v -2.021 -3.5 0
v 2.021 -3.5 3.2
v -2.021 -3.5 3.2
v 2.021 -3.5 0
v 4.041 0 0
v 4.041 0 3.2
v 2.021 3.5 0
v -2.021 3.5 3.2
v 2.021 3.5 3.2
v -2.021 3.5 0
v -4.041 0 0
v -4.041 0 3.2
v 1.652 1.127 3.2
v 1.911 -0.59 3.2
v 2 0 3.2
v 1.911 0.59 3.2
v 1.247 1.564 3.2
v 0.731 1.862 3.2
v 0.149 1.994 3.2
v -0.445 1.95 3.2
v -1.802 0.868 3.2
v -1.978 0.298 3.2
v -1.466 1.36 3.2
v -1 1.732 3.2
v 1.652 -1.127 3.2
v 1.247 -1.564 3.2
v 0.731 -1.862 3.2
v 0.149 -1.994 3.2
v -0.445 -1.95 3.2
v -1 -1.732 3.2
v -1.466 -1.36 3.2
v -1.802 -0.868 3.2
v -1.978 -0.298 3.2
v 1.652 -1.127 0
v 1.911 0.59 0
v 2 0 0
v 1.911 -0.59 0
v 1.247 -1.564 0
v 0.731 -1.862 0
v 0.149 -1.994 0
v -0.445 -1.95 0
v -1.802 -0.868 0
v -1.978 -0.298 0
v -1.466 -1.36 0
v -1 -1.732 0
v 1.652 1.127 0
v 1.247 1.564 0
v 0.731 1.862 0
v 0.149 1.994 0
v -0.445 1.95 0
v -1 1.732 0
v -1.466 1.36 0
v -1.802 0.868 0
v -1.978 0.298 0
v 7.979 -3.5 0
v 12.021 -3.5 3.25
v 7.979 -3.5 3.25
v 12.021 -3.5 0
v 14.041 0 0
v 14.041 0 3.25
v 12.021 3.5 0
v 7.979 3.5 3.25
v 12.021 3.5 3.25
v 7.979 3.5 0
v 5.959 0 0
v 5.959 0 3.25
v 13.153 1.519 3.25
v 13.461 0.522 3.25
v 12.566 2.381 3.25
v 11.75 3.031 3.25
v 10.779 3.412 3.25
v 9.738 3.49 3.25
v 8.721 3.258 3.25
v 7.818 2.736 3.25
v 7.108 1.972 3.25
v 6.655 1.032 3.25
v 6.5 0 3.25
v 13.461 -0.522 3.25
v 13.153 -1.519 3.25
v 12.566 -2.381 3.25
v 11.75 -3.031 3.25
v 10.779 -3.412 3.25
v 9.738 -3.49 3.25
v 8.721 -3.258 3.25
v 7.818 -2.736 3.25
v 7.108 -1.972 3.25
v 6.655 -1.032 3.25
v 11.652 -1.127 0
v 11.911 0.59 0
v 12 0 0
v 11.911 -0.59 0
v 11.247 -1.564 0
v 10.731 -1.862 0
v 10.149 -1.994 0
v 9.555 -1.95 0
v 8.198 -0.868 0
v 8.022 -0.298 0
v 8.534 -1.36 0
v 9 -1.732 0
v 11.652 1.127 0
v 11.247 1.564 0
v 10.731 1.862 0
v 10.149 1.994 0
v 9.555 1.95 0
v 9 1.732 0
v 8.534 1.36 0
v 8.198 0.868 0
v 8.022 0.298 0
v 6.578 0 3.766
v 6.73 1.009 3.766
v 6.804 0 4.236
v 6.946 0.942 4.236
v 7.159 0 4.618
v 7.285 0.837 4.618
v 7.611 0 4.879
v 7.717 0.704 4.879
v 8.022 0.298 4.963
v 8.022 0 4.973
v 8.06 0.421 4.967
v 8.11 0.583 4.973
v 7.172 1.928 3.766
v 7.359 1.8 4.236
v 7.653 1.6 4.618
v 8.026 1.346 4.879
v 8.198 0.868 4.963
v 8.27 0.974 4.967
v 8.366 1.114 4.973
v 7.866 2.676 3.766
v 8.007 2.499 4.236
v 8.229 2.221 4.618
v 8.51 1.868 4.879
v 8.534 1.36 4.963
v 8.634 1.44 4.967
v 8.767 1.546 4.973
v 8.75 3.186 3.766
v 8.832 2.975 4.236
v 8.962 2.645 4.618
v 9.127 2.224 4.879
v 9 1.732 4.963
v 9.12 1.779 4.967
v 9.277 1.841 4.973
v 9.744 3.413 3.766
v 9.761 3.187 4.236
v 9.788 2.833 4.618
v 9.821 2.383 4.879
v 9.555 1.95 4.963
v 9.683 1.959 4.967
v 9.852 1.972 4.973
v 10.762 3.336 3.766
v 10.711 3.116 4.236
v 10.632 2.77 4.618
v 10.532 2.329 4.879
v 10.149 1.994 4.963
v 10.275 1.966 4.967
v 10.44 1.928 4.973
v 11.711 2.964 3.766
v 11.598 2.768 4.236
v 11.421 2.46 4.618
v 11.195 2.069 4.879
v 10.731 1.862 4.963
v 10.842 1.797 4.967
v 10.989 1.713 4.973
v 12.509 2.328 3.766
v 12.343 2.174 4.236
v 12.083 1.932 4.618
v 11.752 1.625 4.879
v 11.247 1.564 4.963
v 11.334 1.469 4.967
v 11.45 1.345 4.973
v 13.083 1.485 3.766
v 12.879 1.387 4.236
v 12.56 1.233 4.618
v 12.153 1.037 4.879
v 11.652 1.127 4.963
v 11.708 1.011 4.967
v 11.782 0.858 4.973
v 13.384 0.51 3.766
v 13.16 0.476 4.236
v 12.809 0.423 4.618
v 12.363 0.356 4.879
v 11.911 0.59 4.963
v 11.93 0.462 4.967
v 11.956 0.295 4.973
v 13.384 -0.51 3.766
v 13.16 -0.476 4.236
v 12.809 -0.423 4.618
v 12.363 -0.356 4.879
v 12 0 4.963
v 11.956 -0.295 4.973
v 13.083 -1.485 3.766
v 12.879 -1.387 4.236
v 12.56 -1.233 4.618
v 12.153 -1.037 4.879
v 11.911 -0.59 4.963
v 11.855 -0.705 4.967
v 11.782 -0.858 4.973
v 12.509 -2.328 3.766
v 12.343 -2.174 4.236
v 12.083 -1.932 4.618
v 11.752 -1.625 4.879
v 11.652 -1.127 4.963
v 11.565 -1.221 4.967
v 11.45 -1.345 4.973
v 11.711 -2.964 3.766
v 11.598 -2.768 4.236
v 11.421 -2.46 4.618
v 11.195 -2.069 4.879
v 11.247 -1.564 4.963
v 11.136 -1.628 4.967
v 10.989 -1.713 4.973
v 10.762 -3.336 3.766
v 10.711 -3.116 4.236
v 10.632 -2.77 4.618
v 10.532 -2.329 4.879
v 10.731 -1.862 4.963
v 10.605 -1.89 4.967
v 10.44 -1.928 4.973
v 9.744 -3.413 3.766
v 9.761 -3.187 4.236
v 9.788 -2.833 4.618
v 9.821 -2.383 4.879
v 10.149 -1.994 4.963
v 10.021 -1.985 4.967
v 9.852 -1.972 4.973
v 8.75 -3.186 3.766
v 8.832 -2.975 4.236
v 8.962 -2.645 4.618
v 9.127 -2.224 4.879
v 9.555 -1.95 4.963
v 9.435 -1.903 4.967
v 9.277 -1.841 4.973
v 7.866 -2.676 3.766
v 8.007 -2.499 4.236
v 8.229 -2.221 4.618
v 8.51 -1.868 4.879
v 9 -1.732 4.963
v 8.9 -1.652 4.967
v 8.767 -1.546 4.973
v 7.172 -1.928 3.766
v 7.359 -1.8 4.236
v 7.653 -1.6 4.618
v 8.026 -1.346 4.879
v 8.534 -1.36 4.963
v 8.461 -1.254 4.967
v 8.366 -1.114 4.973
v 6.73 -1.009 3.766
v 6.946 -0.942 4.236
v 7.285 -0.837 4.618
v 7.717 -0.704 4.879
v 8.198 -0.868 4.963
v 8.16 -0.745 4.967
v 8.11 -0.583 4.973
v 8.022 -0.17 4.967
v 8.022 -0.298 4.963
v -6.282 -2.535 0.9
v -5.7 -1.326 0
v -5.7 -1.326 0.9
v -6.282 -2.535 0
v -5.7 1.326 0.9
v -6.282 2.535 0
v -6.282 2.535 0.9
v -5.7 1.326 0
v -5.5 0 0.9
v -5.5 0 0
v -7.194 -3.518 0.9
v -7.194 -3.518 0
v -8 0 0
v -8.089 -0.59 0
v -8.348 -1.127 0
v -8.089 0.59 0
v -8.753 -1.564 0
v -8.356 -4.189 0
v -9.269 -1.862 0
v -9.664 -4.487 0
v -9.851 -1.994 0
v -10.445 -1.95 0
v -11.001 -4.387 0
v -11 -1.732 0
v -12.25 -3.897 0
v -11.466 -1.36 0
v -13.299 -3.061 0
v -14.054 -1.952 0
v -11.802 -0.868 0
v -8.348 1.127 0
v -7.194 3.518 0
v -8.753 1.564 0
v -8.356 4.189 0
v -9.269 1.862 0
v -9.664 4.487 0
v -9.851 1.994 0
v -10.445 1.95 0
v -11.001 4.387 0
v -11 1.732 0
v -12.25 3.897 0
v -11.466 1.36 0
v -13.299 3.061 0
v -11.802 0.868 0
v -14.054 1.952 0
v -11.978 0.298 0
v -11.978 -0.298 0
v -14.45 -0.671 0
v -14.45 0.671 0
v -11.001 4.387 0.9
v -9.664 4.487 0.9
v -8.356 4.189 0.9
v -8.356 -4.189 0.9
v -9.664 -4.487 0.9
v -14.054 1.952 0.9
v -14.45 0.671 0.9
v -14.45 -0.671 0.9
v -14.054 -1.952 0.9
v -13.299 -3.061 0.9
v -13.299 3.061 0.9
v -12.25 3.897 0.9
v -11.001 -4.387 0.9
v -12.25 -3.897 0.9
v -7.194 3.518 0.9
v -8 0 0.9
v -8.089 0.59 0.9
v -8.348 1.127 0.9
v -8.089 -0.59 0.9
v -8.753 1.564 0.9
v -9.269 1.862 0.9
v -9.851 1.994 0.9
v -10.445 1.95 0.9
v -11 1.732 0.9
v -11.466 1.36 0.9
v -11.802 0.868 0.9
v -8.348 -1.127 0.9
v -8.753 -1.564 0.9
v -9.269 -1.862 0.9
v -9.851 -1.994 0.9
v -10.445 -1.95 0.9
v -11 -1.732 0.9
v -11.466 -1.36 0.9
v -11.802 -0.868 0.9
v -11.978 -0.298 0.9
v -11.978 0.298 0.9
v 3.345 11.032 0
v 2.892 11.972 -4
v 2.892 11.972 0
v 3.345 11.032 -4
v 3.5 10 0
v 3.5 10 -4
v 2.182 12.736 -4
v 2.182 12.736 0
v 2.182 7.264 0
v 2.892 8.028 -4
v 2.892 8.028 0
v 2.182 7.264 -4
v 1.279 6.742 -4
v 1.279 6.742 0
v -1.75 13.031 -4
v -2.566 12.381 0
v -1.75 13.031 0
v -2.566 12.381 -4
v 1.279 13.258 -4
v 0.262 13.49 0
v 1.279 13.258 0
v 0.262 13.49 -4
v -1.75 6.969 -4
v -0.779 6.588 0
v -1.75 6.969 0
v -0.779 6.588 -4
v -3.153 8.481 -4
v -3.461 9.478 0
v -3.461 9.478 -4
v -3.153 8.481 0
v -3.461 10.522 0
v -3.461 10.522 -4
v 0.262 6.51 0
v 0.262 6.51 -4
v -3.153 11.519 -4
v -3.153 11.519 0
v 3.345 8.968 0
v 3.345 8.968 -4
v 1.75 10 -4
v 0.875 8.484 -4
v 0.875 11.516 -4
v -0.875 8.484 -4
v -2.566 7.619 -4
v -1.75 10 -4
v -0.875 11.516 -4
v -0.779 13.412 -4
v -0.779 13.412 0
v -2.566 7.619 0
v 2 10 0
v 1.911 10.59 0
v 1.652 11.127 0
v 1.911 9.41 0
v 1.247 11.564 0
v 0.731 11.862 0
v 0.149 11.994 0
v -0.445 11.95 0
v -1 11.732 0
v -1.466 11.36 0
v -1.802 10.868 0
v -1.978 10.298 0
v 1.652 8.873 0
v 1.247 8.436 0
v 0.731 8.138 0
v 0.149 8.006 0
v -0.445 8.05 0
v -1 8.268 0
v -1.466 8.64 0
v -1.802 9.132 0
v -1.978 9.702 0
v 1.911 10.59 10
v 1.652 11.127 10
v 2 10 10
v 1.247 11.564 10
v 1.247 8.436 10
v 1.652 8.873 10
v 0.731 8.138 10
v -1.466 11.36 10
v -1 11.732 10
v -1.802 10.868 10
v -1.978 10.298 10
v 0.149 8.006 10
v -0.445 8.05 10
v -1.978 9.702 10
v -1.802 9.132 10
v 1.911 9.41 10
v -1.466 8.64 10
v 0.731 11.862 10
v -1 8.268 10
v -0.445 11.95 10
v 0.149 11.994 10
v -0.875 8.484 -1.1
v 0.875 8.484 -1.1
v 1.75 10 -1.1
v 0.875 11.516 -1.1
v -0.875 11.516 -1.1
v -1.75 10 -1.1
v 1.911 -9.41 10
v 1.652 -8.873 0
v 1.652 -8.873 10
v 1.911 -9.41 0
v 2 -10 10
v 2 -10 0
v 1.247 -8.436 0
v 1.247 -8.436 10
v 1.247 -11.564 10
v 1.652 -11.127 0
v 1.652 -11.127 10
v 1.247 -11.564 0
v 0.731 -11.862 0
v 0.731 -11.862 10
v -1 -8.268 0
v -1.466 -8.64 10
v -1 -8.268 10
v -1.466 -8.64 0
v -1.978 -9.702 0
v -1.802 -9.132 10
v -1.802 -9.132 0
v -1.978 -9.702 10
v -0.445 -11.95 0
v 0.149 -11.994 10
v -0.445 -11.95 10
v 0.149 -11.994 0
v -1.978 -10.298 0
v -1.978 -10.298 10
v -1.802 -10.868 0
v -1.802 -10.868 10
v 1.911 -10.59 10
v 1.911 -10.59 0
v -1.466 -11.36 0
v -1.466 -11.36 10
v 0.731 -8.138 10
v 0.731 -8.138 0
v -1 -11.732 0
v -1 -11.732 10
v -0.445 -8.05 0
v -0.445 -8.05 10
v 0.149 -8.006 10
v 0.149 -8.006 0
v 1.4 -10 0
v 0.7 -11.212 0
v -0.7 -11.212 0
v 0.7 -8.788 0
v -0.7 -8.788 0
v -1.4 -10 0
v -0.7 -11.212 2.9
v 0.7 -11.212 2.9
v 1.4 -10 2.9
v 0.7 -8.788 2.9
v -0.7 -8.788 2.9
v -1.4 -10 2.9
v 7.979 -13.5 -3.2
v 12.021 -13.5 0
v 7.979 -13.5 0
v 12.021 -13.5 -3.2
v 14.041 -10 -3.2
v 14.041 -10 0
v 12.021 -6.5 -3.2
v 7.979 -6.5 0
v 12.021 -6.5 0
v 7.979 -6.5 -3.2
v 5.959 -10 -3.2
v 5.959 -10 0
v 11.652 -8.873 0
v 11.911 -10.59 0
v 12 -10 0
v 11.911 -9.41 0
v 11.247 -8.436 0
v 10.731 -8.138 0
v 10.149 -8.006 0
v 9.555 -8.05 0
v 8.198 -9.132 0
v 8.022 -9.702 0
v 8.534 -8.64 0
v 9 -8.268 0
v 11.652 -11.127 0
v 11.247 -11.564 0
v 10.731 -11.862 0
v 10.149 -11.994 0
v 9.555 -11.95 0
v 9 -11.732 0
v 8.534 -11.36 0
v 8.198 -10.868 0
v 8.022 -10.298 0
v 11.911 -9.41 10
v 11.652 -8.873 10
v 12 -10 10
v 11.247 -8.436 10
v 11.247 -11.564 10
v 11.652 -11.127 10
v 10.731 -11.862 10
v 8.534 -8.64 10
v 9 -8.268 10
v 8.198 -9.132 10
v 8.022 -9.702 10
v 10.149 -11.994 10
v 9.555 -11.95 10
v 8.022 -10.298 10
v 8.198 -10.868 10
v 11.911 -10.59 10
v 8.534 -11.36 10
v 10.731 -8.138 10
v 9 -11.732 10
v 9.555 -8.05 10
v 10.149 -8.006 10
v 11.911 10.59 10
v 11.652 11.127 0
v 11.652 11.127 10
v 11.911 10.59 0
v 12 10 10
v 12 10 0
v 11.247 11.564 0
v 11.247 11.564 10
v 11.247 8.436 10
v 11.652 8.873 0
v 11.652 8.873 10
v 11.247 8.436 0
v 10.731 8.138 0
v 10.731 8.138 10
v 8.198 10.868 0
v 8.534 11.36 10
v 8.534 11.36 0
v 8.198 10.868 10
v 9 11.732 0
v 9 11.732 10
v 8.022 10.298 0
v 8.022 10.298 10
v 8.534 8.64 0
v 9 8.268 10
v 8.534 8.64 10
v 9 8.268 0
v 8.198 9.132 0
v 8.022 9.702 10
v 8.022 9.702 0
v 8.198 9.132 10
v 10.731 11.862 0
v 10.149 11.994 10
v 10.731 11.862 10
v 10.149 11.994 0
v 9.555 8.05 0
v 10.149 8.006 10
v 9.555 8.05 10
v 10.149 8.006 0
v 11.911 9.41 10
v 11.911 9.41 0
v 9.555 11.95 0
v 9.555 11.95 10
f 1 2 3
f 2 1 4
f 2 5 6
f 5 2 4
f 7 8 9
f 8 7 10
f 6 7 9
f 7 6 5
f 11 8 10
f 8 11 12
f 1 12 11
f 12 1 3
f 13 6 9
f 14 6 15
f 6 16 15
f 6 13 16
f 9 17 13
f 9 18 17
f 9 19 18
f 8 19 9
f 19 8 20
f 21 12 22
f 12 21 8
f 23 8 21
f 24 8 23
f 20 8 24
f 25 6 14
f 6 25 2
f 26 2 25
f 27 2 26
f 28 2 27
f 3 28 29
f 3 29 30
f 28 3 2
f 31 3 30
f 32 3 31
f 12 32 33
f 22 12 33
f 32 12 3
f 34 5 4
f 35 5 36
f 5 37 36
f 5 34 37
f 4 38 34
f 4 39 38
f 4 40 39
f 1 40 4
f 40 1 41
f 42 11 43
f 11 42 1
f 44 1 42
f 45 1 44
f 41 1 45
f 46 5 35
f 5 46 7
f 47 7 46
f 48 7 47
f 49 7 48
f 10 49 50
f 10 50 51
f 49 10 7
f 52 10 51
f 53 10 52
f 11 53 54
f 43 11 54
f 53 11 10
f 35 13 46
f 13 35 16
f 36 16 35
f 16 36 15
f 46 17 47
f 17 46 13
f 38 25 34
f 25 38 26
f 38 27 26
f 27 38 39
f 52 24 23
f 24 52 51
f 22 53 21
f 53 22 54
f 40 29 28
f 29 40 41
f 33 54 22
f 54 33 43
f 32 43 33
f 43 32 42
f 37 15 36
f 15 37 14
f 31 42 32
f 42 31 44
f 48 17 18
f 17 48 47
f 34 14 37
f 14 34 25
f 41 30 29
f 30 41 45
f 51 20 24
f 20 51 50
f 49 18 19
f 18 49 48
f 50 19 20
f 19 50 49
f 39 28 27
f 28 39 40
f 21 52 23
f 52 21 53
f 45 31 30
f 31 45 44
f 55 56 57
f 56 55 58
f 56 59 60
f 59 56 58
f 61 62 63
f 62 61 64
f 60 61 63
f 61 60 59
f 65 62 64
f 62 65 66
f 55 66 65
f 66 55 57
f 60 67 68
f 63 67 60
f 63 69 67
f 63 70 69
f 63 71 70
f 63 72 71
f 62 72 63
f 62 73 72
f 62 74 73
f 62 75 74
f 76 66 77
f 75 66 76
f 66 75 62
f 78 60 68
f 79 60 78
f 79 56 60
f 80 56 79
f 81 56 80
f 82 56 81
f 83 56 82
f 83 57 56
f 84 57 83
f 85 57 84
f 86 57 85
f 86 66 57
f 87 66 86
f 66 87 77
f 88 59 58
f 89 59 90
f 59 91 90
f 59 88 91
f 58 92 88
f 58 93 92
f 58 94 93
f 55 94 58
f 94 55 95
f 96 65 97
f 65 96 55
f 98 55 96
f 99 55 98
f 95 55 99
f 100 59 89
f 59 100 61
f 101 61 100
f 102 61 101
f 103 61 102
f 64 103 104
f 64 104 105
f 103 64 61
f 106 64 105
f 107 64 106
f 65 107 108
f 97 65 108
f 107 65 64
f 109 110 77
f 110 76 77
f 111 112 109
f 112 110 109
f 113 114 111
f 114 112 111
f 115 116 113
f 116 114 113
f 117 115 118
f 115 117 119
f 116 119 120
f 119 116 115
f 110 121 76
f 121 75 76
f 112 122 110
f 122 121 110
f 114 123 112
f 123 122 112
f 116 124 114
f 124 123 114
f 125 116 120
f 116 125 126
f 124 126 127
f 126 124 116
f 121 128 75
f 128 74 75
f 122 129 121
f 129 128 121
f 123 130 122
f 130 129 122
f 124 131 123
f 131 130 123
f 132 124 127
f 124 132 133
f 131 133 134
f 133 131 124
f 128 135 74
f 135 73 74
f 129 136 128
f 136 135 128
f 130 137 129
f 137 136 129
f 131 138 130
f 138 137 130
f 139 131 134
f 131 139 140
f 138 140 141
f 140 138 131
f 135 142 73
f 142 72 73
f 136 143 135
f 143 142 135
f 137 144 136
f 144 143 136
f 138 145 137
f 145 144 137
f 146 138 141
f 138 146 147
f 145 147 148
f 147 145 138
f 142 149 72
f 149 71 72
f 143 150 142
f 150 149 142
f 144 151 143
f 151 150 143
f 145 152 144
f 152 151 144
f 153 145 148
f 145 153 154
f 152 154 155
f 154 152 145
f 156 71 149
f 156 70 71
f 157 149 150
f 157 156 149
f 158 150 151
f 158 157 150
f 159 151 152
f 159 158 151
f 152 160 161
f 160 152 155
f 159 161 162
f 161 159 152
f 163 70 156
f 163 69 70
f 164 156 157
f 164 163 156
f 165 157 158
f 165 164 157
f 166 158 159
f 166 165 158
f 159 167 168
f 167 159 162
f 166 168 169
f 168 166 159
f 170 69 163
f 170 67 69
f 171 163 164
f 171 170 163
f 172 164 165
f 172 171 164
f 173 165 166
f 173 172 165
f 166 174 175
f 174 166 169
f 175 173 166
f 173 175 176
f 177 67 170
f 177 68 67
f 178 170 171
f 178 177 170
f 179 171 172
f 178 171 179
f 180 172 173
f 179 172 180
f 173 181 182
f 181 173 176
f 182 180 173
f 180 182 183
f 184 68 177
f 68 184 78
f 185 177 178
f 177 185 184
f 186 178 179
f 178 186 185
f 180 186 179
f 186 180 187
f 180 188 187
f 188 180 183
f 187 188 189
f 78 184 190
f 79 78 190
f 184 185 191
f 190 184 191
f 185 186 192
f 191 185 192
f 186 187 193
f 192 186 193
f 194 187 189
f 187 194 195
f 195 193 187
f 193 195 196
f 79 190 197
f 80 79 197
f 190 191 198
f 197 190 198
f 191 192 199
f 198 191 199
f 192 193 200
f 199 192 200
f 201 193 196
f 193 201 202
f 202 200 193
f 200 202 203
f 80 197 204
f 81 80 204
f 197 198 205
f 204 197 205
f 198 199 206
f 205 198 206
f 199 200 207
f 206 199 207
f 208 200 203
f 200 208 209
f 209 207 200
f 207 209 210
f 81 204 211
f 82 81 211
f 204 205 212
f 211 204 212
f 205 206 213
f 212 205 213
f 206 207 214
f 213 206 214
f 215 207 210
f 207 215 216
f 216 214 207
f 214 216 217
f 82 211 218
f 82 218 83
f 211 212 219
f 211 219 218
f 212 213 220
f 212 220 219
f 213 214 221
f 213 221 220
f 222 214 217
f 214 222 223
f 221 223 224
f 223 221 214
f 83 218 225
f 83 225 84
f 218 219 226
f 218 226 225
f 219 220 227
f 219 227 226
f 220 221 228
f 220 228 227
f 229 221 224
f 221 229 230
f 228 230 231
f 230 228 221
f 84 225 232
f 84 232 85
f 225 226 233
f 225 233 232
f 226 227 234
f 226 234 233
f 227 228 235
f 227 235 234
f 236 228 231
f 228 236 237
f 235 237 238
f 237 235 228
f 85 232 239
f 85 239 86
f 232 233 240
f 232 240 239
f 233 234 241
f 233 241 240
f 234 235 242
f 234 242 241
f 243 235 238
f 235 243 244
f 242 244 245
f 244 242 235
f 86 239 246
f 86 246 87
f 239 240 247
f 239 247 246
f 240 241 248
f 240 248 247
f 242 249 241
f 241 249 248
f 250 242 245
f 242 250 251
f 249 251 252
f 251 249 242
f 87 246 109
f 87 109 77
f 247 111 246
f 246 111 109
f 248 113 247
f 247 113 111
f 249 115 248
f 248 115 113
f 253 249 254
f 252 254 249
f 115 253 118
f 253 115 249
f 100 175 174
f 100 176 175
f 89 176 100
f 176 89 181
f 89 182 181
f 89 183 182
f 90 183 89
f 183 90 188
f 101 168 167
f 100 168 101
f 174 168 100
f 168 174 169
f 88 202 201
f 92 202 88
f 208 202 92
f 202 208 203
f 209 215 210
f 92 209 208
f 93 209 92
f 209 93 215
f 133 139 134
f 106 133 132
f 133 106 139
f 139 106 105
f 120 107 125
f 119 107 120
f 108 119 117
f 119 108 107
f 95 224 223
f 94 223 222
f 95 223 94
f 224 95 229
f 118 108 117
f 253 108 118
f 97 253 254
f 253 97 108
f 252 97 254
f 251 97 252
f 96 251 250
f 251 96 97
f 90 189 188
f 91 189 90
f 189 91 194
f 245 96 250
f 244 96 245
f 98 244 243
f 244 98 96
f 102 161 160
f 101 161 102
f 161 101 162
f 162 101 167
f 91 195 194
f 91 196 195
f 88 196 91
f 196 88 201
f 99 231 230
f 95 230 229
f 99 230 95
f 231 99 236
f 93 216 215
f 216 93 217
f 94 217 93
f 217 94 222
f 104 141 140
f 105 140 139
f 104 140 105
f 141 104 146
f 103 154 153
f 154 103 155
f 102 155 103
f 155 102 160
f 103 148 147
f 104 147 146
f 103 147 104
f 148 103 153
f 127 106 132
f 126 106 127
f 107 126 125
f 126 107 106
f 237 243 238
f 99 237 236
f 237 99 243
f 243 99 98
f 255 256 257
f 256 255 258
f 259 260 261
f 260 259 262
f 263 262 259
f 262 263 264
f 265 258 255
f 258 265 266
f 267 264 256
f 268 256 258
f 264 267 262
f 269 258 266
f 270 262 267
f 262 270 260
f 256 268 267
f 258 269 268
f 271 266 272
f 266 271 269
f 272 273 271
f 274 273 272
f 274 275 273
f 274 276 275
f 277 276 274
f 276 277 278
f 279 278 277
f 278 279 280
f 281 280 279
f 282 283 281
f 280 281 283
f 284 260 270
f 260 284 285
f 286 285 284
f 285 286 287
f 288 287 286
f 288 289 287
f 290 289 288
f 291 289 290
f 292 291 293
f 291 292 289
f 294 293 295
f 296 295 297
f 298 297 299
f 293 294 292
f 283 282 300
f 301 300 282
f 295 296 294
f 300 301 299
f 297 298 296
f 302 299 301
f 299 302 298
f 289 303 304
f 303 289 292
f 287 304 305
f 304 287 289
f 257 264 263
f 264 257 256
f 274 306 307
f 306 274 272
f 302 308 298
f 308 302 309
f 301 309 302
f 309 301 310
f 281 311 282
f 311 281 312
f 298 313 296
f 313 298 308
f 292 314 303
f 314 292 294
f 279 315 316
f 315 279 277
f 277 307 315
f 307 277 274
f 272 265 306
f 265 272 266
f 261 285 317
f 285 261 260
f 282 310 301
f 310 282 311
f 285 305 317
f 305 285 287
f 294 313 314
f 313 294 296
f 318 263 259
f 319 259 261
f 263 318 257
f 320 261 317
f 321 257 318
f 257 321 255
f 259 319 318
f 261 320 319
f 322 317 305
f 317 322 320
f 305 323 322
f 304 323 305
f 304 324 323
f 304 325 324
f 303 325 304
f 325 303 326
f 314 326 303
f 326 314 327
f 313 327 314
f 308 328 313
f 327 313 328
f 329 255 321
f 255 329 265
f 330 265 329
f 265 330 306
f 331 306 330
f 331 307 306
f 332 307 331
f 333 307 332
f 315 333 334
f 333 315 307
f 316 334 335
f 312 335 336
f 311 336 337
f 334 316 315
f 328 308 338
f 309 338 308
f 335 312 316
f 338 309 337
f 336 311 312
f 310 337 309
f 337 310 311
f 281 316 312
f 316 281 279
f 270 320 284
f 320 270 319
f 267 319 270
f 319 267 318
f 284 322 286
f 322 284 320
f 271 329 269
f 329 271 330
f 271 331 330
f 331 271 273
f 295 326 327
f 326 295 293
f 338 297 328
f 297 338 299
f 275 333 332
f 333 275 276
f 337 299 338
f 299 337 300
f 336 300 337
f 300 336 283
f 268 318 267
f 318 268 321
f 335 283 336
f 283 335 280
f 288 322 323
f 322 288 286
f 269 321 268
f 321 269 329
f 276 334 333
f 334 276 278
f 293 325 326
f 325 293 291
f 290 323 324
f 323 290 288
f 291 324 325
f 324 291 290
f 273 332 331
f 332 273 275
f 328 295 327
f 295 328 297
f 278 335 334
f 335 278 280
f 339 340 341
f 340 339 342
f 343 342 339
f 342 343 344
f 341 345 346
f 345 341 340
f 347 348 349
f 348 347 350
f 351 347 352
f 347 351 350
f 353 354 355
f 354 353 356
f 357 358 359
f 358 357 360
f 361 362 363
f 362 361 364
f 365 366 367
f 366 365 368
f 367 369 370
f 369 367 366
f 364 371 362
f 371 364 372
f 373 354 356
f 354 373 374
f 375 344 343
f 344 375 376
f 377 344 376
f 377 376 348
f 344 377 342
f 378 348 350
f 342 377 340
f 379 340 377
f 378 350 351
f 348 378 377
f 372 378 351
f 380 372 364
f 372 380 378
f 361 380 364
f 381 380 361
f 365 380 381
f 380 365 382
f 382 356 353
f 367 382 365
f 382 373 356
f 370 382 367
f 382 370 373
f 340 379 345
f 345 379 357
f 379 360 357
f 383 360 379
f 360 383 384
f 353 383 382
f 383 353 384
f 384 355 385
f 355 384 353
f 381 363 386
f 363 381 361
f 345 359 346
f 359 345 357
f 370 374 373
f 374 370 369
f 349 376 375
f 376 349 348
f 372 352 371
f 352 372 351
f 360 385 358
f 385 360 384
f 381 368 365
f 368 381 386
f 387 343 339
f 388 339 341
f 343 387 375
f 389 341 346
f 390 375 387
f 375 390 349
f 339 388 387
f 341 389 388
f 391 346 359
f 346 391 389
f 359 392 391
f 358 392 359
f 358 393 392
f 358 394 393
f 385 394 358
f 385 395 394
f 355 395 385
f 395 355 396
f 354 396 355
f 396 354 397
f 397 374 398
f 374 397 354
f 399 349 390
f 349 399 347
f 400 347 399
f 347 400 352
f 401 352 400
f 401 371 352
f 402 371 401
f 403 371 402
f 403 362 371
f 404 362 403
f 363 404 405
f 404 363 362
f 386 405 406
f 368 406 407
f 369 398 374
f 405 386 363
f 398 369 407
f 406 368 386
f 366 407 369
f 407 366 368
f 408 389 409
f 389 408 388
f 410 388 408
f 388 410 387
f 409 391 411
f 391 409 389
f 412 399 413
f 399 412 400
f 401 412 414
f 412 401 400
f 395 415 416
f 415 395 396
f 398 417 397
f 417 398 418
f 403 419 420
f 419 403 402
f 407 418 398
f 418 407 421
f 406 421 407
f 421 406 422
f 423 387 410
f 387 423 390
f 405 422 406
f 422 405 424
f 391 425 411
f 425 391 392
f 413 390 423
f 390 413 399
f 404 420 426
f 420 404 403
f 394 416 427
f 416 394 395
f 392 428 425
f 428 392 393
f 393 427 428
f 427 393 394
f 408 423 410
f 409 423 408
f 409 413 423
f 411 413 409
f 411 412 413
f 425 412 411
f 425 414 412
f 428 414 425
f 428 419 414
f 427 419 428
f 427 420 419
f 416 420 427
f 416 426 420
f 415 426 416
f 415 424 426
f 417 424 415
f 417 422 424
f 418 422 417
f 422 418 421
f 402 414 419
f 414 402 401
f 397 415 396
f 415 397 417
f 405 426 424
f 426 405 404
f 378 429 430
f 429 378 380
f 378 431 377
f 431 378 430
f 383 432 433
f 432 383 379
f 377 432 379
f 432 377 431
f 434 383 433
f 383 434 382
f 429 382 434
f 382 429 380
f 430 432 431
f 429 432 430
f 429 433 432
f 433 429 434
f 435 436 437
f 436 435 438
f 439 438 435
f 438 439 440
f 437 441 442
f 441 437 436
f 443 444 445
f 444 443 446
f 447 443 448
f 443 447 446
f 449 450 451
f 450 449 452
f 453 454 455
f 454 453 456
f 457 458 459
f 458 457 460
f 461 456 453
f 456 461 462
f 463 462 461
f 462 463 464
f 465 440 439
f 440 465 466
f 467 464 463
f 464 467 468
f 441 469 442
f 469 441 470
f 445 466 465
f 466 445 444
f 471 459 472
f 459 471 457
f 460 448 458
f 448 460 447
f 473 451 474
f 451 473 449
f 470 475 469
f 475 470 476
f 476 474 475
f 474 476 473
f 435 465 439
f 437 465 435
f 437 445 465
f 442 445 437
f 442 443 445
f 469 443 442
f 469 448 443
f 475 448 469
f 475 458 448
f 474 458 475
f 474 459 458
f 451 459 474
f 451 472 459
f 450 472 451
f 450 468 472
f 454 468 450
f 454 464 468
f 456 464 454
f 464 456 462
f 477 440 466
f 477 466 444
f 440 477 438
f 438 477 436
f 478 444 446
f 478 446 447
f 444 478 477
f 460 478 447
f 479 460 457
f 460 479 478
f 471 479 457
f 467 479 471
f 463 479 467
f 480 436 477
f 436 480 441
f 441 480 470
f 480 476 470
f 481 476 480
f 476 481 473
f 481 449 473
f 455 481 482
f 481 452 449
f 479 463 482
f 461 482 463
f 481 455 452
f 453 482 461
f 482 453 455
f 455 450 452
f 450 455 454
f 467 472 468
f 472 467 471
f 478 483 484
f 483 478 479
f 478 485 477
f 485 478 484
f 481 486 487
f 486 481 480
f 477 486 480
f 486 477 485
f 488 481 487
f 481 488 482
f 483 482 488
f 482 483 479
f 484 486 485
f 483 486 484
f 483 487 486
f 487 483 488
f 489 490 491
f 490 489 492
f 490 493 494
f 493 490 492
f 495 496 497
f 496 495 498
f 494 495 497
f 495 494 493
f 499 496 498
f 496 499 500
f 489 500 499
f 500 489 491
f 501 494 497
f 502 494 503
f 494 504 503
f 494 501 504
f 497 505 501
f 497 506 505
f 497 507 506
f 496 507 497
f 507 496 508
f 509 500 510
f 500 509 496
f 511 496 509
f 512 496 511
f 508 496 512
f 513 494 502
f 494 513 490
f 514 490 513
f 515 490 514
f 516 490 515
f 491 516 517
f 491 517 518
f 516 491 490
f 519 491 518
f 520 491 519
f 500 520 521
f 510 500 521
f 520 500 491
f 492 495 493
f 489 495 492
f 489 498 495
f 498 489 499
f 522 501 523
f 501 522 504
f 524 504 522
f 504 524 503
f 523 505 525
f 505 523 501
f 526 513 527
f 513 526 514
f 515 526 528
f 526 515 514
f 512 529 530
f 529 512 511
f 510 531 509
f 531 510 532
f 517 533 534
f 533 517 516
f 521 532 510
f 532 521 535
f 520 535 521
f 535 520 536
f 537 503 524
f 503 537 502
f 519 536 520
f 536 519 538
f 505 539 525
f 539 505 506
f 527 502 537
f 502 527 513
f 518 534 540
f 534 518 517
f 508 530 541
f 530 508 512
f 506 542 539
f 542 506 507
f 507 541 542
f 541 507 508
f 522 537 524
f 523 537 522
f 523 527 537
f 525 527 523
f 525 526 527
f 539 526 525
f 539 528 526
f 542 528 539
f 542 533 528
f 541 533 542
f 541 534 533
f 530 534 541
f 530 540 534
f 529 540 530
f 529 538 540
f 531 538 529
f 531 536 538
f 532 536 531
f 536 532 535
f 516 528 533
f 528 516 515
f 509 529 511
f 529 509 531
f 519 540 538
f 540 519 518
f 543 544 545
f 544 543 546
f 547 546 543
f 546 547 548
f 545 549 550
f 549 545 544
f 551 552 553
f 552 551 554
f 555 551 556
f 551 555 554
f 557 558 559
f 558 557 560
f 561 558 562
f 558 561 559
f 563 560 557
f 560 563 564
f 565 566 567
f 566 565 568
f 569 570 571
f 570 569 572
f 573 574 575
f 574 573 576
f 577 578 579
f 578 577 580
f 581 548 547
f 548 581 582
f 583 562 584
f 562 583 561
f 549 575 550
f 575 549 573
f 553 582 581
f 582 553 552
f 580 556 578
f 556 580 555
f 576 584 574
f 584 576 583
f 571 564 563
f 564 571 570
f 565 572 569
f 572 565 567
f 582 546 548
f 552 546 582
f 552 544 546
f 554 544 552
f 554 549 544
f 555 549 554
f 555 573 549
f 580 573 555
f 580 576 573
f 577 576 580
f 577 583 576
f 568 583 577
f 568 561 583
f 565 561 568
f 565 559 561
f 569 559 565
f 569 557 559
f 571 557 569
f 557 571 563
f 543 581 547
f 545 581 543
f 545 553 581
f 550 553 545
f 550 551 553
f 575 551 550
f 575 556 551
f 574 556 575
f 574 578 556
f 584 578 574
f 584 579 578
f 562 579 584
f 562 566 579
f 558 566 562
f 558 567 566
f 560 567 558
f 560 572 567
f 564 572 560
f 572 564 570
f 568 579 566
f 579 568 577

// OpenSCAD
// file: ../scad/materials.scad
module aluminium(){
	color([1,1,1]*0.95) for(i=[1:$children]) child(i-1);
}
module aluminum(){
	color([1,1,1]*0.95) for(i=[1:$children]) child(i-1);
}
module bzp(){
    color([0.7,0.7,1]) for(i=[1:$children]) child(i-1);
}
module stainless(){
    color([1,1,1]*0.6) for(i=[1:$children]) child(i-1);
}
module steel(){
    color([1,1,1]*0.5) for(i=[1:$children]) child(i-1);
}
module urethane(){
    color([166/255,119/255,73/255]) for(i=[1:$children]) child(i-1);
}
// file: ../scad/functions.scad
include <hardware_dims.scad>

// Assign Screw array
function getScrewDims(screw) = (screw=="M2") ? m2 : (screw=="M2.5") ? m2_5 : (screw=="M3") ? m3 : (screw=="M4") ? m4 : (screw=="M5") ? m5 : (screw=="M6") ? m6 : (screw=="M8") ? m8 : "error";

function get_screw_dims(screw) = getScrewDims(screw);

function getStepperDims(motor) = (motor=="NEMA8") ? nema8 : (motor=="NEMA11") ? nema11 : (motor=="NEMA14") ? nema14 : (motor=="NEMA17") ? nema17 : (motor=="Pololu 35x26") ? pololu35x26 :"error";

function get_stepper_dims(motor) = getStepperDims(motor);

function getElectronicsHoles(electronics) = (electronics=="Melzi") ? melzi : (electronics=="Mega") ? mega : (electronics=="Printrboard") ? printrboard : (electronics=="Sanguinololu") ? sanguinololu :"error";

function get_electronics_holes(electronics) = getElectronicsHoles(electronics);

function getExtruderGearDims(extruderGear) = (extruderGear=="Arcol8x5") ? arcol8x5 : (extruderGear=="Arcol11x8") ? arcol11x8 : (extruderGear=="Arcol11x5") ? arcol11x5 : (extruderGear=="Arcol13x8") ? arcol13x8 : "error";

function get_extruder_gear_dims(extruderGear) = getExtruderGearDims(extruderGear);

function get_drive_roller_dims(roller) = (roller == "A_7T_5MUR1405") ? A_7T_5MUR1405 : (roller == "A_7T_5MUR1606") ? A_7T_5MUR1606 : (roller == "A_7T_5MUR1905") ? A_7T_5MUR1905 : (roller == "A_7T_5MUR1906") ? A_7T_5MUR1906 : (roller == "A_7T_5MUR2206") ? A_7T_5MUR2206 : (roller == "A_7T_5MUR2510") ? A_7T_5MUR2510 : (roller == "A_7T_5MUR3210") ? A_7T_5MUR3210 : (roller == "A_7T_5MUR3810") ? A_7T_5MUR3810 : (roller == "A_7T_5MUR3812") ? A_7T_5MUR3812 : (roller == "A_7T_5MUR4412") ? A_7T_5MUR4412 : (roller == "A_7T_5MUR5012") ? A_7T_5MUR5012 : (roller == "A_7M_5MUR1206A") ? A_7M_5MUR1206A : (roller == "A_7M_5MUR1206B") ? A_7M_5MUR1206B : "error";
// file: ../scad/hardware_dims.scad
//Screw Dimension arrays
//[Diameter, Cap Head Height, Head Diameter, nut across flats, lock nut height, nut height, washer od, washer thick, pan head diameter]
m2 = [2, 2, 3.8, 4, 2.8, 1.6, 5, 0.3, 4];
m2_5 = [2.5, 2.5, 4.5, 5, 3.8, 2, 6, 0.5, 5];
m3 = [3, 3, 5.5, 5.5, 4, 2.4, 7, 0.6, 6];
m4 = [4, 4, 7, 7, 5, 3.2, 9, 0.9, 8];
m5 = [5, 5, 8.5, 8, 5, 4, 10, 1.1, 10];
m6 = [6, 6, 10, 10, 6, 5, 12.5, 1.8, 12];
m8 = [8, 8, 13, 13, 8, 6.5, 17, 1.8, 16];

//stepper dimension arrays
//[width, length, hole spacing, hole diameter, flange diameter, flange height, shaft length, shaft diameter]
nema8 = [20.3, 30, 16, 2, 15, 1.5, 14, 4];
nema11 = [28.1, 27, 23, 2.5, 21, 2, 20, 5];
nema14 = [35.2, 36, 26, 3, 22, 2, 21, 5];
nema17 = [42.3, 48, 31, 3, 22, 2, 23, 5];
pololu35x26 = [35.2, 26, 26, 3, 22, 2, 21, 5];

//electronics dimension arrays
//[[x,y,z],etc..]
melzi = [[0,0,0],[200,0,0],[0,42,0],[200,42,0]];
mega = [[0,0,0],[80,0,0],[1.3,48.3,0],[76.2,48.3,0]];//TODO: second entry needs fixing
printrboard = [[0,0,0],[91,0,0],[0,52.75,0],[91,52.75,0]];
sanguinololu = [[0,0,0],[94,0,0],[0,44,0],[94,44,0]];

//extruder drive gear dimensions arrays
//[outer diameter, length, inner diameter, hobb diameter, teeth diameter(torus inside to inside), teeth offset(from bottom)]
arcol8x5 = [8,13,5,5,6,5];
arcol11x5 = [11.1,13,5,5,9.1,6];
arcol11x8 = [11.1,13,8,5,9.1,6];
arcol13x8 = [13.3,13,8,5,11.3,6];


//Feed roller with hub 
// [Outside dia, bore, face width, hub projection, hub diameter]
A_7T_5MUR1405 = [14,5,6.35,6.35,11.1];
A_7T_5MUR1606 = [16,6,9.52,6.35,12.7];
A_7T_5MUR1905 = [19,5,6.35,6.35,11.1];
A_7T_5MUR1906 = [19,6,9.52,6.35,12.7];
A_7T_5MUR2206 = [22,6,9.52,6.35,12.7];
A_7T_5MUR2510 = [25,10,9.52,9.52,19];
A_7T_5MUR3210 = [32,10,9.52,9.52,20.62];
A_7T_5MUR3810 = [38,10,9.52,9.52,25.4];
A_7T_5MUR3812 = [38,12,12.7,12.7,25.4];
A_7T_5MUR4412 = [44,12,12.7,12.7,31.75];
A_7T_5MUR5012 = [50,12,12.7,12.7,34.9];

//hubless feed roller
// [outside dia, bore, face width, 0(use same constructor as above), sleeve diameter]
A_7M_5MUR1206A = [12, 6, 6.35, 0, 8.74];
A_7M_5MUR1206B = [12, 6, 18.2, 0, 8.74];
A_7M_5MUR1206C = [12, 6, 12.7, 0, 8.74];
A_7M_5MUR1710 = [17, 10, 6.35, 0, 12.7];
A_7M_5MUR1910 = [19, 10, 12.7, 0, 12.7];
A_7M_5MUR2010 = [20, 10, 12.7, 0, 12.7];
A_7M_5MUR2310 = [23, 10, 12.3, 0, 17.47];
A_7M_5MUR2810A = [28, 10, 11.12, 0, 12.7];
A_7M_5MUR2810B = [28, 10, 17.47, 0, 12.7];
A_7M_5MUR5010 = [50, 10, 17.47, 0, 34.92];
A_7M_5MUR5012A = [50, 12, 19.05, 0, 34.92];	
A_7M_5MUR5012B = [50, 12, 25.4, 0, 34.92];
// file: ../scad/constants.scad
//array positions
//screw
DIAMETER = 0;
CAP_HEAD_HEIGHT = 1;
CAP_HEAD_DIAMETER = 2;
NUT_WIDTH = 3;
LOCK_NUT_HEIGHT = 4;
NUT_HEIGHT = 5;
WASHER_OD = 6;
WASHER_HEIGHT = 7;
PAN_HEAD_DIAMETER = 8;
PAN_HEAD_HEIGHT = 5; //generally within 0.1mm of a nut height, so just use that

//stepper
WIDTH = 0;
LENGTH = 1;
HOLE_SPACING = 2;
HOLE_DIAMETER = 3;
FLANGE_DIAMETER = 4;
FLANGE_HEIGHT = 5;
SHAFT_LENGTH = 6;
SHAFT_DIAMETER = 7;

//extruder drive gear
OUTER_DIAMETER = 0;
INNER_DIAMETER = 0;
HOBB_DIAMETER = 0;
TEETH_DIAMETER = 0;
TEETH_OFFSET = 0;

//Feed Rollers
OUTSIDE_DIAMETER = 0;
BORE_SIZE = 1;
FACE_WIDTH = 2;
HUB_PROJECTION = 3;
HUB_DIAMETER = 4;

//constants
pi = 3.14159;
phi = 1.618;
eta = 0.1; //used to eliminate coincident faces
MAGPIE_OUT = "MAGPIE: ";
// file: ../scad/components.scad
include <hardware_dims.scad>
include <polyholes.scad>
include <constants.scad>
include <functions.scad>
include <materials.scad>

$fn = 21;

module nut(type){
	a = getScrewDims(type);

	difference(type){
		union(){
			stainless()cylinder(r = a[NUT_WIDTH]/cos(30)/2, h = a[NUT_HEIGHT], $fn = 6);
		}
		stainless()translate([0,0,-eta])cylinder(r = a[DIAMETER]/2, h = a[NUT_HEIGHT] + eta * 2);
	}
	echo(str(MAGPIE_OUT, type," nut")); 
}

module lockNut(type){
	a = getScrewDims(type);

	difference(){
		union(){
			stainless()cylinder(r = a[NUT_WIDTH]/cos(30)/2, h = a[LOCK_NUT_HEIGHT]-a[NUT_WIDTH]/4, $fn = 6);
			stainless()translate([0,0,a[LOCK_NUT_HEIGHT]-a[NUT_WIDTH]/4])
				rotate_extrude(convexity = 10)translate([a[NUT_WIDTH]/4,0,0])circle(r = a[NUT_WIDTH]/4);
		}
		stainless()translate([0,0,-eta])cylinder(r=a[DIAMETER]/2, h = a[LOCK_NUT_HEIGHT] + eta*2);
	}
	echo(str(MAGPIE_OUT, type," lock nut")); 
}

module lock_nut(type){
	lockNut(type);
}

module stepper(type){
	a = getStepperDims(type);

		union(){
			steel()translate([0,0,a[LENGTH]/2])cube([a[WIDTH], a[WIDTH], a[LENGTH]], center = true);
			steel()translate([0,0,a[LENGTH]])cylinder(r=a[FLANGE_DIAMETER]/2, h = a[FLANGE_HEIGHT]);
			stainless()translate([0,0,a[LENGTH]+a[FLANGE_HEIGHT]])cylinder(r=a[SHAFT_DIAMETER]/2, h = a[SHAFT_LENGTH]);
		}
	echo(str(MAGPIE_OUT, type," stepper")); 
}

module capScrew(type,length){
	a = getScrewDims(type);

	difference(){
		union(){
			steel()translate([0,0,-a[CAP_HEAD_HEIGHT]])
				cylinder(r = a[CAP_HEAD_DIAMETER]/2, h = a[CAP_HEAD_HEIGHT]);
			steel()cylinder(r = a[DIAMETER]/2, h = round(length));
			
		}
		//make a socket for aesthetics
		steel()translate([0,0,-a[CAP_HEAD_HEIGHT]-eta])
			cylinder(r = a[CAP_HEAD_DIAMETER]/4, h = a[CAP_HEAD_HEIGHT] * 3/4, $fn = 6);
	}
	echo(str(MAGPIE_OUT, type, "x", round(length), " cap screw")); 
}

module cap_screw(type, length){
	capScrew(type,length);
}

module hexScrew(type,length){
	a = getScrewDims(type);

	union(){
		steel()translate([0,0,-a[NUT_HEIGHT]])
			cylinder(r = a[NUT_WIDTH]/cos(30)/2, h = a[NUT_HEIGHT], $fn = 6);
		steel()cylinder(r = a[DIAMETER]/2, h = round(length));
		
	}

	echo(str(MAGPIE_OUT, type, "x", round(length), " hex screw")); 
}

module hex_screw(type, length){
	hexScrew(type,length);
}

module setScrew(type,length){
	a = getScrewDims(type);

	difference(){
		union(){
			steel()cylinder(r = a[DIAMETER]/2, h = round(length));
		}
		//make a socket for aesthetics
		steel()translate([0,0,-eta])
			cylinder(r = a[CAP_HEAD_DIAMETER]/5, h = a[CAP_HEAD_HEIGHT] * 3/4, $fn = 6);
	}
	echo(str(MAGPIE_OUT, type, "x", round(length), " set screw")); 
}

module set_screw(type, length){
	setScrew(type,length);
}

module flatWasher(type){
	a = getScrewDims(type);

	difference(){
		union(){
			stainless()cylinder(r = a[WASHER_OD]/2, h = a[WASHER_HEIGHT]);
		}
		stainless()translate([0,0,-eta])cylinder(r = a[DIAMETER]/2, h = a[WASHER_HEIGHT] + eta * 2);
	}
	echo(str(MAGPIE_OUT, type," flat washer")); 
}

module flat_washer(type){
	flatWasher(type);
}

module allThread(type, length){
	a = getScrewDims(type);

	//don't round up on all thread
	difference(){
		union(){
			steel()cylinder(r = a[DIAMETER]/2, h = round(length));
		}
	}
	echo(str(MAGPIE_OUT, type, "x", round(length), " threaded rod")); 
}

module all_thread(type,length){
	allThread(type,length);
}

module extruderGear(type){
	lextruder_gear_array = get_extruder_gear_dims(type);

	
	lextruder_gear_od = lextruder_gear_array[0];
	lextruder_gear_id = lextruder_gear_array[1];
	lextruder_gear_hobb_diameter = lextruder_gear_array[2];
	lextruder_gear_teeth_diameter = lextruder_gear_array[3];
	lextruder_gear_teeth_offset = lextruder_gear_array[4];
	lextruder_gear_height = lextruder_gear_array[5];

	color("silver")difference(){
		color("silver")union(){
			translate([0,0,-lextruder_gear_teeth_offset])cylinder(r=lextruder_gear_od/2, h=lextruder_gear_height);
		}
		translate([0,0,-eta-lextruder_gear_teeth_offset])cylinder(r=lextruder_gear_id/2, h=lextruder_gear_height+eta*2);
		rotate_extrude(convexity = 10)translate([lextruder_gear_hobb_diameter/2+lextruder_gear_teeth_diameter/2,0,0])circle(r = lextruder_gear_teeth_diameter/2);
	}
	echo(str(MAGPIE_OUT, type, " hobbed extruder drive gear")); 
}

module ptfeRod(radius,length){
	difference(){
		union(){
			color("white")cylinder(r = radius, h = round(length));
		}
	}
	echo(str(MAGPIE_OUT,radius*2,"mm diameter ", round(length), "mm long PTFE rod")); 
}

module ptfe_rod(radius, length){
	ptfeRod(radius, length);
}
// file: ../scad/polyholes.scad
//
// Mendel90
//
// GNU GPL v2
// nop.head@gmail.com
// hydraraptor.blogspot.com
//
// See http://hydraraptor.blogspot.com/2011/02/polyholes.html
//
function sides(r) = max(round(4 *r),3);
function correctedRadius(r,n) = 0.1 + r / cos(180 / n);
function correctedDiameter(d) = 0.2 + d / cos(180 / sides(d / 2));

module polyCircle(r, center = false) {
    n = sides(r);
    circle(r = correctedRadius(r,n), $fn = n, center = center);
}

module poly_circle(r, center = false) {
	polyCircle(r, center);
}

module polyCylinder(r, h, center = false) {
    n = sides(r);
    cylinder(h = h, r = correctedRadius(r,n), $fn = n, center = center);
}

module poly_cylinder(r, h, center = false) {
	polyCylinder(r,h,center);
}

module polydCylinder(r, center = false) {
    n = sides(r);
    r = correctedRadius(r,n);
    cylinder(h = h, r = r, $fn = n, center = center);
    translate([0, -r, 0])
        cube([r, 2 * r, h]);
}

module poly_d_cylinder(r, center = false) {
	polydCylinder(r,center);
}
// file: ../magpie.scad
//Use all the things
use <./scad/polyholes.scad>
use <./scad/components.scad>
include <./scad/constants.scad>
include <./scad/hardware_dims.scad>
include <./scad/functions.scad>
// main file
include <../magpie.scad>

//m4 tests
a = "M4";
nut(a);
translate([10,0,0])lockNut(a);
translate([-10,0,0])flatWasher(a);
translate([0,10,0])capScrew(a,10);
translate([0,-10,0])setScrew(a,10);
translate([10,10,0])allThread(a,10);
translate([10,-10,0])hexScrew(a,10);
